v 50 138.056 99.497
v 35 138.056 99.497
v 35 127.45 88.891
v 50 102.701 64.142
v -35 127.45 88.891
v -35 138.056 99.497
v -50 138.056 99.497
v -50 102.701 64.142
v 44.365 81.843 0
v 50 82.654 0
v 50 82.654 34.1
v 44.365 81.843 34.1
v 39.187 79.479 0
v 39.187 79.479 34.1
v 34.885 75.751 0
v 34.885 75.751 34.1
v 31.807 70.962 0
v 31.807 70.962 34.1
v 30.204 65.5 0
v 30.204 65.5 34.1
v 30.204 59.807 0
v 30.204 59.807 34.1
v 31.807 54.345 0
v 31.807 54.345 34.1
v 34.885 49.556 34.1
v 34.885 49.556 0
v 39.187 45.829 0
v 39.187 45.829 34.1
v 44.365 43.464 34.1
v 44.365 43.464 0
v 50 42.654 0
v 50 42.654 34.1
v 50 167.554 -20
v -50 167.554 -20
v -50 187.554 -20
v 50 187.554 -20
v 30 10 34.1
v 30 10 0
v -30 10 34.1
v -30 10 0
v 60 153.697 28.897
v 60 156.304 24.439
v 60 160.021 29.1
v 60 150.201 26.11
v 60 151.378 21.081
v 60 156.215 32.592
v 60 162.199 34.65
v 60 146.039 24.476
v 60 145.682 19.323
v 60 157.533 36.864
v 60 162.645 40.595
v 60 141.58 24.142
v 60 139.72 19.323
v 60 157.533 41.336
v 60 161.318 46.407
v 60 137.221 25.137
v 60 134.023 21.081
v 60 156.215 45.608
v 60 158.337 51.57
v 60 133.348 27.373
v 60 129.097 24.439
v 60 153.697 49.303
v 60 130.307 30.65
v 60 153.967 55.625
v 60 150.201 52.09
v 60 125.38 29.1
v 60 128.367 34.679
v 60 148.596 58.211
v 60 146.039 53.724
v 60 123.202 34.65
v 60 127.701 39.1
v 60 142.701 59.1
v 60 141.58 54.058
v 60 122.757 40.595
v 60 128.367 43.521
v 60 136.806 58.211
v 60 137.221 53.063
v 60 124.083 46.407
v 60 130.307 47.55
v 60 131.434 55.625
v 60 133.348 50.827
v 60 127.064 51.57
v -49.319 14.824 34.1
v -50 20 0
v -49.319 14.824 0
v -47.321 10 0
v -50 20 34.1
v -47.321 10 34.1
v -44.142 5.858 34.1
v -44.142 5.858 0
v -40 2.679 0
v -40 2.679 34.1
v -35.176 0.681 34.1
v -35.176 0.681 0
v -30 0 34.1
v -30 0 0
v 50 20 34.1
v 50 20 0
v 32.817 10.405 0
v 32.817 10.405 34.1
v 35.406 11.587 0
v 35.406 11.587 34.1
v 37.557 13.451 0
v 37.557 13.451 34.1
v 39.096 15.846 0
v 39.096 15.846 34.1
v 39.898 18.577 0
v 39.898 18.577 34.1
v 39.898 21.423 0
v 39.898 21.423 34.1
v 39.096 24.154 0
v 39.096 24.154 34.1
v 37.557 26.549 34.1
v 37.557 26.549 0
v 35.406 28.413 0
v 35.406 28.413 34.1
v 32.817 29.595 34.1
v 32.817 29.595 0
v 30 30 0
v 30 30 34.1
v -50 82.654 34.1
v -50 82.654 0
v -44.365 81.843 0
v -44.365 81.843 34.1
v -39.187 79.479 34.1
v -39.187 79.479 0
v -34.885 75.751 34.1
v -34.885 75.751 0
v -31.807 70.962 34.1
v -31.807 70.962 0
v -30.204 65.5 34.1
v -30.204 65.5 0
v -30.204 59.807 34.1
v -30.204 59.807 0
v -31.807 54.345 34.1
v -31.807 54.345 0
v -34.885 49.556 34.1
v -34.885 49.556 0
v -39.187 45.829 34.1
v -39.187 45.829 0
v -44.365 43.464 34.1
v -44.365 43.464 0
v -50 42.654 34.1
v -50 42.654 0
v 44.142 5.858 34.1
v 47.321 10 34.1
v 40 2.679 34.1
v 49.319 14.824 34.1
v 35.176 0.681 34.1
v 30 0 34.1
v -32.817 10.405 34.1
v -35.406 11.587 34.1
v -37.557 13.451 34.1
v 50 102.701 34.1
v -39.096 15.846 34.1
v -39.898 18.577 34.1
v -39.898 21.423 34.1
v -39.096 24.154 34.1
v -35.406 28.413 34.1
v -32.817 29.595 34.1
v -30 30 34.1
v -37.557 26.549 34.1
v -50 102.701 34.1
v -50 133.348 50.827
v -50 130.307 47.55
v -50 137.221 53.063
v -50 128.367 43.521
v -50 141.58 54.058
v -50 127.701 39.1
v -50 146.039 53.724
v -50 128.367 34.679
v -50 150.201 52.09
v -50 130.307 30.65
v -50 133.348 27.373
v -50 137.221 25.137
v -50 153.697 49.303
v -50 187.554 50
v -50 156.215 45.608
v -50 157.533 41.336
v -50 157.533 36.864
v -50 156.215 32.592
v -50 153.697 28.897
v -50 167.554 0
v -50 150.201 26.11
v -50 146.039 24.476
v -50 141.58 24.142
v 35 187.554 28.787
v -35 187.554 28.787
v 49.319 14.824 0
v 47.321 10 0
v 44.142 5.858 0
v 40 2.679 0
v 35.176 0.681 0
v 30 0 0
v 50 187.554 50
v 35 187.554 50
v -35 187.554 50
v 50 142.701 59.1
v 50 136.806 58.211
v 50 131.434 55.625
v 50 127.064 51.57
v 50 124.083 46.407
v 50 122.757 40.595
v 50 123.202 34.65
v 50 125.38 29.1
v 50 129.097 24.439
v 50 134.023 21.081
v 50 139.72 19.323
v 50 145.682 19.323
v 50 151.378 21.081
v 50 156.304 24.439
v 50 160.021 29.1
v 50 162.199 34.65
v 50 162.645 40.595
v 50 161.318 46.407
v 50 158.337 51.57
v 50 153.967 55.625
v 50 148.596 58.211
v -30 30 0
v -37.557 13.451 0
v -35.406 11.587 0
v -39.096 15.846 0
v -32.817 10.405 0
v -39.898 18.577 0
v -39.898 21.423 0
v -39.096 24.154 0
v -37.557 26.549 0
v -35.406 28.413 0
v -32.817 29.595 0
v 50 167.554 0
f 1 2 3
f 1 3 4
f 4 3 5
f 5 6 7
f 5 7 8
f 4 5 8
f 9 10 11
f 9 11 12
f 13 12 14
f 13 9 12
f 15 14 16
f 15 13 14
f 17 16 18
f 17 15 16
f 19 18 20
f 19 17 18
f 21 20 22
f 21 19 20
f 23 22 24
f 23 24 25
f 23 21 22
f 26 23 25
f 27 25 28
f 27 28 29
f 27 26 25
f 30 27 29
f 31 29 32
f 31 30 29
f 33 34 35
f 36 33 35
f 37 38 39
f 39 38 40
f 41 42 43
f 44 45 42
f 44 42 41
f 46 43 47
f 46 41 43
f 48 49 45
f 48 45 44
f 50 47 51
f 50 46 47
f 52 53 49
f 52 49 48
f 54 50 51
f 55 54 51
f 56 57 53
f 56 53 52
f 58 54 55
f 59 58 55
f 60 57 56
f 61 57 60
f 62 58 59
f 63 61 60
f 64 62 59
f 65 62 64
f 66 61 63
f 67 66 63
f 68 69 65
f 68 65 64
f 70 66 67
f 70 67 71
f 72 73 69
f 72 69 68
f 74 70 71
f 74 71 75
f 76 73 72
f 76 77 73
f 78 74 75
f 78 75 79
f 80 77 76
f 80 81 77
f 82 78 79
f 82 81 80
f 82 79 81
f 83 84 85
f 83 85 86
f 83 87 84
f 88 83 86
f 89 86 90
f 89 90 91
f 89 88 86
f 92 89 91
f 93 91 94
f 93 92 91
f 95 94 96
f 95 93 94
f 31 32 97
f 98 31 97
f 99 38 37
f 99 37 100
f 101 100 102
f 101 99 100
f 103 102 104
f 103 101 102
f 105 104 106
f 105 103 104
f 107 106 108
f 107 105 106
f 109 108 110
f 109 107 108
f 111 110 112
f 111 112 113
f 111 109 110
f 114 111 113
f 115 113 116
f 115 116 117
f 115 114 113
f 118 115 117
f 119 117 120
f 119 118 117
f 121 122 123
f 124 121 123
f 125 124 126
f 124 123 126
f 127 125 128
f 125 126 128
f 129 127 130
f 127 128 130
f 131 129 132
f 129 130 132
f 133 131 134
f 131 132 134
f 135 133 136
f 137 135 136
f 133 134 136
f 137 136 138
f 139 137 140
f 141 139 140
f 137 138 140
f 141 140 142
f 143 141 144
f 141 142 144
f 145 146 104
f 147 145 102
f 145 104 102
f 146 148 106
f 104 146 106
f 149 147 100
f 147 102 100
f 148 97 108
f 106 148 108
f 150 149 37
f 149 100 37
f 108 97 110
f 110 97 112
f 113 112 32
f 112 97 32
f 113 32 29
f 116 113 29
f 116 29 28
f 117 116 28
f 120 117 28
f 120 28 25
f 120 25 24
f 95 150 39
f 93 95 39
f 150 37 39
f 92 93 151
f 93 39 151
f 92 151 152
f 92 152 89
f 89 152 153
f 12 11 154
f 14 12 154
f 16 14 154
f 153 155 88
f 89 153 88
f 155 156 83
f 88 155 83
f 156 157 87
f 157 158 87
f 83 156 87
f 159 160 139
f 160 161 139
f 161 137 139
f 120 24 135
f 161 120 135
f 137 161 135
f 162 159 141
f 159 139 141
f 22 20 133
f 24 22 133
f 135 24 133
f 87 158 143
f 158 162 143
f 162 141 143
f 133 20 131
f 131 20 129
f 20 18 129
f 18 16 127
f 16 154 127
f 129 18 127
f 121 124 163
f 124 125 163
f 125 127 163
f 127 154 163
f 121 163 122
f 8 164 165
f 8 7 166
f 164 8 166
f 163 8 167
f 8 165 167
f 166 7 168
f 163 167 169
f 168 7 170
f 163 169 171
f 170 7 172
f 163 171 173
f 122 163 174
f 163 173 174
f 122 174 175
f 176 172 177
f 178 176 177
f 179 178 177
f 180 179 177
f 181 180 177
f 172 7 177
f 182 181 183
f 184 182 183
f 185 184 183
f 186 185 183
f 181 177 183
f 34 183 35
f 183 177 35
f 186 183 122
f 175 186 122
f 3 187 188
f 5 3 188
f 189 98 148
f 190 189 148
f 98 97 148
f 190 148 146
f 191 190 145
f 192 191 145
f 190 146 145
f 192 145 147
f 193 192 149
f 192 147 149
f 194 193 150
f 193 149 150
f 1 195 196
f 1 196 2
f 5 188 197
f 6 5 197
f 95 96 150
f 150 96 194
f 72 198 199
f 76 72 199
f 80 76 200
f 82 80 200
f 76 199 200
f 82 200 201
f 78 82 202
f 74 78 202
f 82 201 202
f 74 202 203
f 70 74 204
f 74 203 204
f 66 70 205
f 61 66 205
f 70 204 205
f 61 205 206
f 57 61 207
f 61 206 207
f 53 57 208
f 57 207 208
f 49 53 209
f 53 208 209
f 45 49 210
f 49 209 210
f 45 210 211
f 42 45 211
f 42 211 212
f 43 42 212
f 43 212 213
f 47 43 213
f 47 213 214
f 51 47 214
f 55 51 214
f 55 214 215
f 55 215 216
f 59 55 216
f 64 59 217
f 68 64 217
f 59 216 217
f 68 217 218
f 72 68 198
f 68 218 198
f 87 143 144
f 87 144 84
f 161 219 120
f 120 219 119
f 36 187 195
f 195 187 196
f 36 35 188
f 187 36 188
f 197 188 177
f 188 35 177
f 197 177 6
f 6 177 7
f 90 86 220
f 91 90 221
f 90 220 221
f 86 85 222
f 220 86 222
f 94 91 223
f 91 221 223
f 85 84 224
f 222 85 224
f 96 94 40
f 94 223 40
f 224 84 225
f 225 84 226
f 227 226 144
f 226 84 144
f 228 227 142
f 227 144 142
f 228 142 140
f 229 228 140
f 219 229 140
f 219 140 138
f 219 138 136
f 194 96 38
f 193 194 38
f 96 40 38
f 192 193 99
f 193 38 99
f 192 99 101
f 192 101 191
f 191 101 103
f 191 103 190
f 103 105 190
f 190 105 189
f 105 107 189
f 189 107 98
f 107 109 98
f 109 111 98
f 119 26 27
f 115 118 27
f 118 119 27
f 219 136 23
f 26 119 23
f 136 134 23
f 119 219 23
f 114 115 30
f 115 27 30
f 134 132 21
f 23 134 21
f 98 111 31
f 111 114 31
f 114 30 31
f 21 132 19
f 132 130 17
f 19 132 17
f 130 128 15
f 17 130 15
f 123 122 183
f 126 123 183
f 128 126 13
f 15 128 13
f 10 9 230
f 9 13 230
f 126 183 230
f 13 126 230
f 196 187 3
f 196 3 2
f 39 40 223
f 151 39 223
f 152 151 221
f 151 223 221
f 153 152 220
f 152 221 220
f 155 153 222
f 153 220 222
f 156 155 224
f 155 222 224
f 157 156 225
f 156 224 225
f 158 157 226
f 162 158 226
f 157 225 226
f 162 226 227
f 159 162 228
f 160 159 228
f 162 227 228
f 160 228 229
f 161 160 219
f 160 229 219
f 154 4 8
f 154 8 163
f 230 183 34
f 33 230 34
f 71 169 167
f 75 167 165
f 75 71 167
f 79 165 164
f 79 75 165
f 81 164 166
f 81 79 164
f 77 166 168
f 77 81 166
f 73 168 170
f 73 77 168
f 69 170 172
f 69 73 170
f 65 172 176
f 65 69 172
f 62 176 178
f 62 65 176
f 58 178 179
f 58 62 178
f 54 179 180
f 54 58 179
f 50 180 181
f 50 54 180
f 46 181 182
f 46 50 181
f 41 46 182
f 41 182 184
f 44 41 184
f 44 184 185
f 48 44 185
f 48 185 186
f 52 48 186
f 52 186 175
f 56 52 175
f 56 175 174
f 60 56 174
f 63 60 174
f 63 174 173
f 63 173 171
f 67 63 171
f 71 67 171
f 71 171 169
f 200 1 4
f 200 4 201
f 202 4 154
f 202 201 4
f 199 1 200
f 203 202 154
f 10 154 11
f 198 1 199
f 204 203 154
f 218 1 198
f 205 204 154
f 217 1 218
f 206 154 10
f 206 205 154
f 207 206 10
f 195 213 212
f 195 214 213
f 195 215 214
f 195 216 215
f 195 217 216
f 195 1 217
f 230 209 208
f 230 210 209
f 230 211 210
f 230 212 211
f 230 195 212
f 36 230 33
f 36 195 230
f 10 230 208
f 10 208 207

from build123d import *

# Parameters (mm, degrees)
EXTRUDE_1_DEPTH          = 34.1
FILLET_2_R               = 20
SKETCH_1_5_W             = 50
SKETCH_1_5_H             = 84.9
EXTRUDE_3_DEPTH          = 34.1
SKETCH_4_W               = 20
SKETCH_4_H               = 20
EXTRUDE_4_DEPTH          = 50
EXTRUDE_5_DEPTH          = 50
SKETCH_7_R               = 15
CUT_EXTRUDE_1_DEPTH      = 219.119470794
SKETCH_8_W               = 35
SKETCH_8_H               = 15
CUT_EXTRUDE_2_DEPTH      = 212.953207538
FILLET_2_OF_MIRROR_1_R   = 20
SKETCH_13_R              = 20
EXTRUDE_6_DEPTH          = 10
CUT_EXTRUDE_3_DEPTH      = 235.682985193
CUT_EXTRUDE_3_DEPTH_BACK = 235.682985193
SKETCH_15_R              = 15


with BuildPart() as part:
    # Эскиз1 → Бобышка-Вытянуть1 (new body)
    with BuildSketch(Plane.XY):
        with BuildLine():
            ThreePointArc((30, 10), (40, 20), (30, 30))
            Line((30, 30), (0, 30))
            Line((0, 30), (0, 102.653608526))
            Line((0, 102.653608526), (50, 102.653608526))
            Line((50, 102.653608526), (50, 82.653608526))
            ThreePointArc((50, 82.653608526), (30, 62.653608526), (50, 42.653608526))
            Line((50, 42.653608526), (50, 0))
            Line((50, 0), (0, 0))
            Line((0, 0), (0, 10))
            Line((0, 10), (30, 10))
        make_face()
    extrude_1 = extrude(amount=EXTRUDE_1_DEPTH)

    # Скругление2
    fillet_2_edges = [part.edges().sort_by_distance(p)[0] for p in [
        (50, 0, 17.05),
    ]]
    fillet(fillet_2_edges, radius=FILLET_2_R)

    # Эскиз1<5> → Бобышка-Вытянуть3 (add)
    with BuildSketch(Plane.XY):
        with Locations((25, 145.103608526)):
            Rectangle(SKETCH_1_5_W, SKETCH_1_5_H)
    extrude_3 = extrude(amount=EXTRUDE_3_DEPTH)

    # Эскиз4 → Бобышка-Вытянуть4 (add)
    with BuildSketch(Plane(origin=(50, 0, 0), x_dir=(0, 0, -1), z_dir=(1, 0, 0))):
        with Locations((10, 177.553608526)):
            Rectangle(SKETCH_4_W, SKETCH_4_H)
    extrude_4 = extrude(amount=-EXTRUDE_4_DEPTH)

    # Эскиз5 → Бобышка-Вытянуть5 (add)
    with BuildSketch(Plane(origin=(50, 0, 0), x_dir=(0, 0, -1), z_dir=(1, 0, 0))):
        Polygon((-34.1, 187.553608526), (-50, 187.553608526), (-99.497474683, 138.056133842), (-64.142135624, 102.700794783), (-34.1, 102.700794783), align=None)
    extrude_5 = extrude(amount=-EXTRUDE_5_DEPTH)

    # Эскиз7 → Вырез-Вытянуть1 (cut, symmetric)
    with BuildSketch(Plane(origin=(50, 0, 0), x_dir=(0, 0, -1), z_dir=(1, 0, 0))):
        with Locations((-39.1, 142.700794783)):
            Circle(SKETCH_7_R)
    cut_extrude_1 = extrude(amount=CUT_EXTRUDE_1_DEPTH, both=True, mode=Mode.SUBTRACT)

    # Эскиз8 → Вырез-Вытянуть2 (cut, through all)
    with BuildSketch(Plane(origin=(0, 19.27932958, -19.27932958), x_dir=(1, 0, 0), z_dir=(0, -0.7071067811865498, 0.7071067811865454))):
        with Locations((17.5, 160.475767484)):
            Rectangle(SKETCH_8_W, SKETCH_8_H)
    cut_extrude_2 = extrude(amount=-CUT_EXTRUDE_2_DEPTH, mode=Mode.SUBTRACT)

    # Зеркальное отражение1: Бобышка-Вытянуть1, Бобышка-Вытянуть3, Бобышка-Вытянуть4, Бобышка-Вытянуть5, Вырез-Вытянуть1, Вырез-Вытянуть2 across plane
    add(extrude_1.mirror(Plane(origin=(0, 0, 34.1), x_dir=(0, 0, 1), z_dir=(1, 0, 0))))
    add(extrude_3.mirror(Plane(origin=(0, 0, 34.1), x_dir=(0, 0, 1), z_dir=(1, 0, 0))))
    add(extrude_4.mirror(Plane(origin=(0, 0, 34.1), x_dir=(0, 0, 1), z_dir=(1, 0, 0))))
    add(extrude_5.mirror(Plane(origin=(0, 0, 34.1), x_dir=(0, 0, 1), z_dir=(1, 0, 0))))
    add(cut_extrude_1.mirror(Plane(origin=(0, 0, 34.1), x_dir=(0, 0, 1), z_dir=(1, 0, 0))), mode=Mode.SUBTRACT)
    add(cut_extrude_2.mirror(Plane(origin=(0, 0, 34.1), x_dir=(0, 0, 1), z_dir=(1, 0, 0))), mode=Mode.SUBTRACT)

    # Скругление2 of Зеркальное отражение1
    fillet_2_of_mirror_1_edges = [part.edges().sort_by_distance(p)[0] for p in [
        (-50, 0, 17.05),
    ]]
    fillet(fillet_2_of_mirror_1_edges, radius=FILLET_2_OF_MIRROR_1_R)

    # Эскиз13 → Бобышка-Вытянуть6 (add)
    with BuildSketch(Plane(origin=(50, 0, 0), x_dir=(0, 0, -1), z_dir=(1, 0, 0))):
        with Locations(Location((-39.1, 142.700794783, 0), (0, 0, 180))):
            Circle(SKETCH_13_R)
    extrude(amount=EXTRUDE_6_DEPTH)

    # Эскиз15 → Вырез-Вытянуть3 (cut, two sides: drawn at the far end of the back side and taken through both)
    with BuildSketch(Plane.ZY.offset(-50).offset(-CUT_EXTRUDE_3_DEPTH_BACK)):
        with Locations(Location((39.1, 142.700794783, 0), (0, 0, 270))):
            Circle(SKETCH_15_R)
    extrude(amount=CUT_EXTRUDE_3_DEPTH + CUT_EXTRUDE_3_DEPTH_BACK, mode=Mode.SUBTRACT)


solid = part.part
